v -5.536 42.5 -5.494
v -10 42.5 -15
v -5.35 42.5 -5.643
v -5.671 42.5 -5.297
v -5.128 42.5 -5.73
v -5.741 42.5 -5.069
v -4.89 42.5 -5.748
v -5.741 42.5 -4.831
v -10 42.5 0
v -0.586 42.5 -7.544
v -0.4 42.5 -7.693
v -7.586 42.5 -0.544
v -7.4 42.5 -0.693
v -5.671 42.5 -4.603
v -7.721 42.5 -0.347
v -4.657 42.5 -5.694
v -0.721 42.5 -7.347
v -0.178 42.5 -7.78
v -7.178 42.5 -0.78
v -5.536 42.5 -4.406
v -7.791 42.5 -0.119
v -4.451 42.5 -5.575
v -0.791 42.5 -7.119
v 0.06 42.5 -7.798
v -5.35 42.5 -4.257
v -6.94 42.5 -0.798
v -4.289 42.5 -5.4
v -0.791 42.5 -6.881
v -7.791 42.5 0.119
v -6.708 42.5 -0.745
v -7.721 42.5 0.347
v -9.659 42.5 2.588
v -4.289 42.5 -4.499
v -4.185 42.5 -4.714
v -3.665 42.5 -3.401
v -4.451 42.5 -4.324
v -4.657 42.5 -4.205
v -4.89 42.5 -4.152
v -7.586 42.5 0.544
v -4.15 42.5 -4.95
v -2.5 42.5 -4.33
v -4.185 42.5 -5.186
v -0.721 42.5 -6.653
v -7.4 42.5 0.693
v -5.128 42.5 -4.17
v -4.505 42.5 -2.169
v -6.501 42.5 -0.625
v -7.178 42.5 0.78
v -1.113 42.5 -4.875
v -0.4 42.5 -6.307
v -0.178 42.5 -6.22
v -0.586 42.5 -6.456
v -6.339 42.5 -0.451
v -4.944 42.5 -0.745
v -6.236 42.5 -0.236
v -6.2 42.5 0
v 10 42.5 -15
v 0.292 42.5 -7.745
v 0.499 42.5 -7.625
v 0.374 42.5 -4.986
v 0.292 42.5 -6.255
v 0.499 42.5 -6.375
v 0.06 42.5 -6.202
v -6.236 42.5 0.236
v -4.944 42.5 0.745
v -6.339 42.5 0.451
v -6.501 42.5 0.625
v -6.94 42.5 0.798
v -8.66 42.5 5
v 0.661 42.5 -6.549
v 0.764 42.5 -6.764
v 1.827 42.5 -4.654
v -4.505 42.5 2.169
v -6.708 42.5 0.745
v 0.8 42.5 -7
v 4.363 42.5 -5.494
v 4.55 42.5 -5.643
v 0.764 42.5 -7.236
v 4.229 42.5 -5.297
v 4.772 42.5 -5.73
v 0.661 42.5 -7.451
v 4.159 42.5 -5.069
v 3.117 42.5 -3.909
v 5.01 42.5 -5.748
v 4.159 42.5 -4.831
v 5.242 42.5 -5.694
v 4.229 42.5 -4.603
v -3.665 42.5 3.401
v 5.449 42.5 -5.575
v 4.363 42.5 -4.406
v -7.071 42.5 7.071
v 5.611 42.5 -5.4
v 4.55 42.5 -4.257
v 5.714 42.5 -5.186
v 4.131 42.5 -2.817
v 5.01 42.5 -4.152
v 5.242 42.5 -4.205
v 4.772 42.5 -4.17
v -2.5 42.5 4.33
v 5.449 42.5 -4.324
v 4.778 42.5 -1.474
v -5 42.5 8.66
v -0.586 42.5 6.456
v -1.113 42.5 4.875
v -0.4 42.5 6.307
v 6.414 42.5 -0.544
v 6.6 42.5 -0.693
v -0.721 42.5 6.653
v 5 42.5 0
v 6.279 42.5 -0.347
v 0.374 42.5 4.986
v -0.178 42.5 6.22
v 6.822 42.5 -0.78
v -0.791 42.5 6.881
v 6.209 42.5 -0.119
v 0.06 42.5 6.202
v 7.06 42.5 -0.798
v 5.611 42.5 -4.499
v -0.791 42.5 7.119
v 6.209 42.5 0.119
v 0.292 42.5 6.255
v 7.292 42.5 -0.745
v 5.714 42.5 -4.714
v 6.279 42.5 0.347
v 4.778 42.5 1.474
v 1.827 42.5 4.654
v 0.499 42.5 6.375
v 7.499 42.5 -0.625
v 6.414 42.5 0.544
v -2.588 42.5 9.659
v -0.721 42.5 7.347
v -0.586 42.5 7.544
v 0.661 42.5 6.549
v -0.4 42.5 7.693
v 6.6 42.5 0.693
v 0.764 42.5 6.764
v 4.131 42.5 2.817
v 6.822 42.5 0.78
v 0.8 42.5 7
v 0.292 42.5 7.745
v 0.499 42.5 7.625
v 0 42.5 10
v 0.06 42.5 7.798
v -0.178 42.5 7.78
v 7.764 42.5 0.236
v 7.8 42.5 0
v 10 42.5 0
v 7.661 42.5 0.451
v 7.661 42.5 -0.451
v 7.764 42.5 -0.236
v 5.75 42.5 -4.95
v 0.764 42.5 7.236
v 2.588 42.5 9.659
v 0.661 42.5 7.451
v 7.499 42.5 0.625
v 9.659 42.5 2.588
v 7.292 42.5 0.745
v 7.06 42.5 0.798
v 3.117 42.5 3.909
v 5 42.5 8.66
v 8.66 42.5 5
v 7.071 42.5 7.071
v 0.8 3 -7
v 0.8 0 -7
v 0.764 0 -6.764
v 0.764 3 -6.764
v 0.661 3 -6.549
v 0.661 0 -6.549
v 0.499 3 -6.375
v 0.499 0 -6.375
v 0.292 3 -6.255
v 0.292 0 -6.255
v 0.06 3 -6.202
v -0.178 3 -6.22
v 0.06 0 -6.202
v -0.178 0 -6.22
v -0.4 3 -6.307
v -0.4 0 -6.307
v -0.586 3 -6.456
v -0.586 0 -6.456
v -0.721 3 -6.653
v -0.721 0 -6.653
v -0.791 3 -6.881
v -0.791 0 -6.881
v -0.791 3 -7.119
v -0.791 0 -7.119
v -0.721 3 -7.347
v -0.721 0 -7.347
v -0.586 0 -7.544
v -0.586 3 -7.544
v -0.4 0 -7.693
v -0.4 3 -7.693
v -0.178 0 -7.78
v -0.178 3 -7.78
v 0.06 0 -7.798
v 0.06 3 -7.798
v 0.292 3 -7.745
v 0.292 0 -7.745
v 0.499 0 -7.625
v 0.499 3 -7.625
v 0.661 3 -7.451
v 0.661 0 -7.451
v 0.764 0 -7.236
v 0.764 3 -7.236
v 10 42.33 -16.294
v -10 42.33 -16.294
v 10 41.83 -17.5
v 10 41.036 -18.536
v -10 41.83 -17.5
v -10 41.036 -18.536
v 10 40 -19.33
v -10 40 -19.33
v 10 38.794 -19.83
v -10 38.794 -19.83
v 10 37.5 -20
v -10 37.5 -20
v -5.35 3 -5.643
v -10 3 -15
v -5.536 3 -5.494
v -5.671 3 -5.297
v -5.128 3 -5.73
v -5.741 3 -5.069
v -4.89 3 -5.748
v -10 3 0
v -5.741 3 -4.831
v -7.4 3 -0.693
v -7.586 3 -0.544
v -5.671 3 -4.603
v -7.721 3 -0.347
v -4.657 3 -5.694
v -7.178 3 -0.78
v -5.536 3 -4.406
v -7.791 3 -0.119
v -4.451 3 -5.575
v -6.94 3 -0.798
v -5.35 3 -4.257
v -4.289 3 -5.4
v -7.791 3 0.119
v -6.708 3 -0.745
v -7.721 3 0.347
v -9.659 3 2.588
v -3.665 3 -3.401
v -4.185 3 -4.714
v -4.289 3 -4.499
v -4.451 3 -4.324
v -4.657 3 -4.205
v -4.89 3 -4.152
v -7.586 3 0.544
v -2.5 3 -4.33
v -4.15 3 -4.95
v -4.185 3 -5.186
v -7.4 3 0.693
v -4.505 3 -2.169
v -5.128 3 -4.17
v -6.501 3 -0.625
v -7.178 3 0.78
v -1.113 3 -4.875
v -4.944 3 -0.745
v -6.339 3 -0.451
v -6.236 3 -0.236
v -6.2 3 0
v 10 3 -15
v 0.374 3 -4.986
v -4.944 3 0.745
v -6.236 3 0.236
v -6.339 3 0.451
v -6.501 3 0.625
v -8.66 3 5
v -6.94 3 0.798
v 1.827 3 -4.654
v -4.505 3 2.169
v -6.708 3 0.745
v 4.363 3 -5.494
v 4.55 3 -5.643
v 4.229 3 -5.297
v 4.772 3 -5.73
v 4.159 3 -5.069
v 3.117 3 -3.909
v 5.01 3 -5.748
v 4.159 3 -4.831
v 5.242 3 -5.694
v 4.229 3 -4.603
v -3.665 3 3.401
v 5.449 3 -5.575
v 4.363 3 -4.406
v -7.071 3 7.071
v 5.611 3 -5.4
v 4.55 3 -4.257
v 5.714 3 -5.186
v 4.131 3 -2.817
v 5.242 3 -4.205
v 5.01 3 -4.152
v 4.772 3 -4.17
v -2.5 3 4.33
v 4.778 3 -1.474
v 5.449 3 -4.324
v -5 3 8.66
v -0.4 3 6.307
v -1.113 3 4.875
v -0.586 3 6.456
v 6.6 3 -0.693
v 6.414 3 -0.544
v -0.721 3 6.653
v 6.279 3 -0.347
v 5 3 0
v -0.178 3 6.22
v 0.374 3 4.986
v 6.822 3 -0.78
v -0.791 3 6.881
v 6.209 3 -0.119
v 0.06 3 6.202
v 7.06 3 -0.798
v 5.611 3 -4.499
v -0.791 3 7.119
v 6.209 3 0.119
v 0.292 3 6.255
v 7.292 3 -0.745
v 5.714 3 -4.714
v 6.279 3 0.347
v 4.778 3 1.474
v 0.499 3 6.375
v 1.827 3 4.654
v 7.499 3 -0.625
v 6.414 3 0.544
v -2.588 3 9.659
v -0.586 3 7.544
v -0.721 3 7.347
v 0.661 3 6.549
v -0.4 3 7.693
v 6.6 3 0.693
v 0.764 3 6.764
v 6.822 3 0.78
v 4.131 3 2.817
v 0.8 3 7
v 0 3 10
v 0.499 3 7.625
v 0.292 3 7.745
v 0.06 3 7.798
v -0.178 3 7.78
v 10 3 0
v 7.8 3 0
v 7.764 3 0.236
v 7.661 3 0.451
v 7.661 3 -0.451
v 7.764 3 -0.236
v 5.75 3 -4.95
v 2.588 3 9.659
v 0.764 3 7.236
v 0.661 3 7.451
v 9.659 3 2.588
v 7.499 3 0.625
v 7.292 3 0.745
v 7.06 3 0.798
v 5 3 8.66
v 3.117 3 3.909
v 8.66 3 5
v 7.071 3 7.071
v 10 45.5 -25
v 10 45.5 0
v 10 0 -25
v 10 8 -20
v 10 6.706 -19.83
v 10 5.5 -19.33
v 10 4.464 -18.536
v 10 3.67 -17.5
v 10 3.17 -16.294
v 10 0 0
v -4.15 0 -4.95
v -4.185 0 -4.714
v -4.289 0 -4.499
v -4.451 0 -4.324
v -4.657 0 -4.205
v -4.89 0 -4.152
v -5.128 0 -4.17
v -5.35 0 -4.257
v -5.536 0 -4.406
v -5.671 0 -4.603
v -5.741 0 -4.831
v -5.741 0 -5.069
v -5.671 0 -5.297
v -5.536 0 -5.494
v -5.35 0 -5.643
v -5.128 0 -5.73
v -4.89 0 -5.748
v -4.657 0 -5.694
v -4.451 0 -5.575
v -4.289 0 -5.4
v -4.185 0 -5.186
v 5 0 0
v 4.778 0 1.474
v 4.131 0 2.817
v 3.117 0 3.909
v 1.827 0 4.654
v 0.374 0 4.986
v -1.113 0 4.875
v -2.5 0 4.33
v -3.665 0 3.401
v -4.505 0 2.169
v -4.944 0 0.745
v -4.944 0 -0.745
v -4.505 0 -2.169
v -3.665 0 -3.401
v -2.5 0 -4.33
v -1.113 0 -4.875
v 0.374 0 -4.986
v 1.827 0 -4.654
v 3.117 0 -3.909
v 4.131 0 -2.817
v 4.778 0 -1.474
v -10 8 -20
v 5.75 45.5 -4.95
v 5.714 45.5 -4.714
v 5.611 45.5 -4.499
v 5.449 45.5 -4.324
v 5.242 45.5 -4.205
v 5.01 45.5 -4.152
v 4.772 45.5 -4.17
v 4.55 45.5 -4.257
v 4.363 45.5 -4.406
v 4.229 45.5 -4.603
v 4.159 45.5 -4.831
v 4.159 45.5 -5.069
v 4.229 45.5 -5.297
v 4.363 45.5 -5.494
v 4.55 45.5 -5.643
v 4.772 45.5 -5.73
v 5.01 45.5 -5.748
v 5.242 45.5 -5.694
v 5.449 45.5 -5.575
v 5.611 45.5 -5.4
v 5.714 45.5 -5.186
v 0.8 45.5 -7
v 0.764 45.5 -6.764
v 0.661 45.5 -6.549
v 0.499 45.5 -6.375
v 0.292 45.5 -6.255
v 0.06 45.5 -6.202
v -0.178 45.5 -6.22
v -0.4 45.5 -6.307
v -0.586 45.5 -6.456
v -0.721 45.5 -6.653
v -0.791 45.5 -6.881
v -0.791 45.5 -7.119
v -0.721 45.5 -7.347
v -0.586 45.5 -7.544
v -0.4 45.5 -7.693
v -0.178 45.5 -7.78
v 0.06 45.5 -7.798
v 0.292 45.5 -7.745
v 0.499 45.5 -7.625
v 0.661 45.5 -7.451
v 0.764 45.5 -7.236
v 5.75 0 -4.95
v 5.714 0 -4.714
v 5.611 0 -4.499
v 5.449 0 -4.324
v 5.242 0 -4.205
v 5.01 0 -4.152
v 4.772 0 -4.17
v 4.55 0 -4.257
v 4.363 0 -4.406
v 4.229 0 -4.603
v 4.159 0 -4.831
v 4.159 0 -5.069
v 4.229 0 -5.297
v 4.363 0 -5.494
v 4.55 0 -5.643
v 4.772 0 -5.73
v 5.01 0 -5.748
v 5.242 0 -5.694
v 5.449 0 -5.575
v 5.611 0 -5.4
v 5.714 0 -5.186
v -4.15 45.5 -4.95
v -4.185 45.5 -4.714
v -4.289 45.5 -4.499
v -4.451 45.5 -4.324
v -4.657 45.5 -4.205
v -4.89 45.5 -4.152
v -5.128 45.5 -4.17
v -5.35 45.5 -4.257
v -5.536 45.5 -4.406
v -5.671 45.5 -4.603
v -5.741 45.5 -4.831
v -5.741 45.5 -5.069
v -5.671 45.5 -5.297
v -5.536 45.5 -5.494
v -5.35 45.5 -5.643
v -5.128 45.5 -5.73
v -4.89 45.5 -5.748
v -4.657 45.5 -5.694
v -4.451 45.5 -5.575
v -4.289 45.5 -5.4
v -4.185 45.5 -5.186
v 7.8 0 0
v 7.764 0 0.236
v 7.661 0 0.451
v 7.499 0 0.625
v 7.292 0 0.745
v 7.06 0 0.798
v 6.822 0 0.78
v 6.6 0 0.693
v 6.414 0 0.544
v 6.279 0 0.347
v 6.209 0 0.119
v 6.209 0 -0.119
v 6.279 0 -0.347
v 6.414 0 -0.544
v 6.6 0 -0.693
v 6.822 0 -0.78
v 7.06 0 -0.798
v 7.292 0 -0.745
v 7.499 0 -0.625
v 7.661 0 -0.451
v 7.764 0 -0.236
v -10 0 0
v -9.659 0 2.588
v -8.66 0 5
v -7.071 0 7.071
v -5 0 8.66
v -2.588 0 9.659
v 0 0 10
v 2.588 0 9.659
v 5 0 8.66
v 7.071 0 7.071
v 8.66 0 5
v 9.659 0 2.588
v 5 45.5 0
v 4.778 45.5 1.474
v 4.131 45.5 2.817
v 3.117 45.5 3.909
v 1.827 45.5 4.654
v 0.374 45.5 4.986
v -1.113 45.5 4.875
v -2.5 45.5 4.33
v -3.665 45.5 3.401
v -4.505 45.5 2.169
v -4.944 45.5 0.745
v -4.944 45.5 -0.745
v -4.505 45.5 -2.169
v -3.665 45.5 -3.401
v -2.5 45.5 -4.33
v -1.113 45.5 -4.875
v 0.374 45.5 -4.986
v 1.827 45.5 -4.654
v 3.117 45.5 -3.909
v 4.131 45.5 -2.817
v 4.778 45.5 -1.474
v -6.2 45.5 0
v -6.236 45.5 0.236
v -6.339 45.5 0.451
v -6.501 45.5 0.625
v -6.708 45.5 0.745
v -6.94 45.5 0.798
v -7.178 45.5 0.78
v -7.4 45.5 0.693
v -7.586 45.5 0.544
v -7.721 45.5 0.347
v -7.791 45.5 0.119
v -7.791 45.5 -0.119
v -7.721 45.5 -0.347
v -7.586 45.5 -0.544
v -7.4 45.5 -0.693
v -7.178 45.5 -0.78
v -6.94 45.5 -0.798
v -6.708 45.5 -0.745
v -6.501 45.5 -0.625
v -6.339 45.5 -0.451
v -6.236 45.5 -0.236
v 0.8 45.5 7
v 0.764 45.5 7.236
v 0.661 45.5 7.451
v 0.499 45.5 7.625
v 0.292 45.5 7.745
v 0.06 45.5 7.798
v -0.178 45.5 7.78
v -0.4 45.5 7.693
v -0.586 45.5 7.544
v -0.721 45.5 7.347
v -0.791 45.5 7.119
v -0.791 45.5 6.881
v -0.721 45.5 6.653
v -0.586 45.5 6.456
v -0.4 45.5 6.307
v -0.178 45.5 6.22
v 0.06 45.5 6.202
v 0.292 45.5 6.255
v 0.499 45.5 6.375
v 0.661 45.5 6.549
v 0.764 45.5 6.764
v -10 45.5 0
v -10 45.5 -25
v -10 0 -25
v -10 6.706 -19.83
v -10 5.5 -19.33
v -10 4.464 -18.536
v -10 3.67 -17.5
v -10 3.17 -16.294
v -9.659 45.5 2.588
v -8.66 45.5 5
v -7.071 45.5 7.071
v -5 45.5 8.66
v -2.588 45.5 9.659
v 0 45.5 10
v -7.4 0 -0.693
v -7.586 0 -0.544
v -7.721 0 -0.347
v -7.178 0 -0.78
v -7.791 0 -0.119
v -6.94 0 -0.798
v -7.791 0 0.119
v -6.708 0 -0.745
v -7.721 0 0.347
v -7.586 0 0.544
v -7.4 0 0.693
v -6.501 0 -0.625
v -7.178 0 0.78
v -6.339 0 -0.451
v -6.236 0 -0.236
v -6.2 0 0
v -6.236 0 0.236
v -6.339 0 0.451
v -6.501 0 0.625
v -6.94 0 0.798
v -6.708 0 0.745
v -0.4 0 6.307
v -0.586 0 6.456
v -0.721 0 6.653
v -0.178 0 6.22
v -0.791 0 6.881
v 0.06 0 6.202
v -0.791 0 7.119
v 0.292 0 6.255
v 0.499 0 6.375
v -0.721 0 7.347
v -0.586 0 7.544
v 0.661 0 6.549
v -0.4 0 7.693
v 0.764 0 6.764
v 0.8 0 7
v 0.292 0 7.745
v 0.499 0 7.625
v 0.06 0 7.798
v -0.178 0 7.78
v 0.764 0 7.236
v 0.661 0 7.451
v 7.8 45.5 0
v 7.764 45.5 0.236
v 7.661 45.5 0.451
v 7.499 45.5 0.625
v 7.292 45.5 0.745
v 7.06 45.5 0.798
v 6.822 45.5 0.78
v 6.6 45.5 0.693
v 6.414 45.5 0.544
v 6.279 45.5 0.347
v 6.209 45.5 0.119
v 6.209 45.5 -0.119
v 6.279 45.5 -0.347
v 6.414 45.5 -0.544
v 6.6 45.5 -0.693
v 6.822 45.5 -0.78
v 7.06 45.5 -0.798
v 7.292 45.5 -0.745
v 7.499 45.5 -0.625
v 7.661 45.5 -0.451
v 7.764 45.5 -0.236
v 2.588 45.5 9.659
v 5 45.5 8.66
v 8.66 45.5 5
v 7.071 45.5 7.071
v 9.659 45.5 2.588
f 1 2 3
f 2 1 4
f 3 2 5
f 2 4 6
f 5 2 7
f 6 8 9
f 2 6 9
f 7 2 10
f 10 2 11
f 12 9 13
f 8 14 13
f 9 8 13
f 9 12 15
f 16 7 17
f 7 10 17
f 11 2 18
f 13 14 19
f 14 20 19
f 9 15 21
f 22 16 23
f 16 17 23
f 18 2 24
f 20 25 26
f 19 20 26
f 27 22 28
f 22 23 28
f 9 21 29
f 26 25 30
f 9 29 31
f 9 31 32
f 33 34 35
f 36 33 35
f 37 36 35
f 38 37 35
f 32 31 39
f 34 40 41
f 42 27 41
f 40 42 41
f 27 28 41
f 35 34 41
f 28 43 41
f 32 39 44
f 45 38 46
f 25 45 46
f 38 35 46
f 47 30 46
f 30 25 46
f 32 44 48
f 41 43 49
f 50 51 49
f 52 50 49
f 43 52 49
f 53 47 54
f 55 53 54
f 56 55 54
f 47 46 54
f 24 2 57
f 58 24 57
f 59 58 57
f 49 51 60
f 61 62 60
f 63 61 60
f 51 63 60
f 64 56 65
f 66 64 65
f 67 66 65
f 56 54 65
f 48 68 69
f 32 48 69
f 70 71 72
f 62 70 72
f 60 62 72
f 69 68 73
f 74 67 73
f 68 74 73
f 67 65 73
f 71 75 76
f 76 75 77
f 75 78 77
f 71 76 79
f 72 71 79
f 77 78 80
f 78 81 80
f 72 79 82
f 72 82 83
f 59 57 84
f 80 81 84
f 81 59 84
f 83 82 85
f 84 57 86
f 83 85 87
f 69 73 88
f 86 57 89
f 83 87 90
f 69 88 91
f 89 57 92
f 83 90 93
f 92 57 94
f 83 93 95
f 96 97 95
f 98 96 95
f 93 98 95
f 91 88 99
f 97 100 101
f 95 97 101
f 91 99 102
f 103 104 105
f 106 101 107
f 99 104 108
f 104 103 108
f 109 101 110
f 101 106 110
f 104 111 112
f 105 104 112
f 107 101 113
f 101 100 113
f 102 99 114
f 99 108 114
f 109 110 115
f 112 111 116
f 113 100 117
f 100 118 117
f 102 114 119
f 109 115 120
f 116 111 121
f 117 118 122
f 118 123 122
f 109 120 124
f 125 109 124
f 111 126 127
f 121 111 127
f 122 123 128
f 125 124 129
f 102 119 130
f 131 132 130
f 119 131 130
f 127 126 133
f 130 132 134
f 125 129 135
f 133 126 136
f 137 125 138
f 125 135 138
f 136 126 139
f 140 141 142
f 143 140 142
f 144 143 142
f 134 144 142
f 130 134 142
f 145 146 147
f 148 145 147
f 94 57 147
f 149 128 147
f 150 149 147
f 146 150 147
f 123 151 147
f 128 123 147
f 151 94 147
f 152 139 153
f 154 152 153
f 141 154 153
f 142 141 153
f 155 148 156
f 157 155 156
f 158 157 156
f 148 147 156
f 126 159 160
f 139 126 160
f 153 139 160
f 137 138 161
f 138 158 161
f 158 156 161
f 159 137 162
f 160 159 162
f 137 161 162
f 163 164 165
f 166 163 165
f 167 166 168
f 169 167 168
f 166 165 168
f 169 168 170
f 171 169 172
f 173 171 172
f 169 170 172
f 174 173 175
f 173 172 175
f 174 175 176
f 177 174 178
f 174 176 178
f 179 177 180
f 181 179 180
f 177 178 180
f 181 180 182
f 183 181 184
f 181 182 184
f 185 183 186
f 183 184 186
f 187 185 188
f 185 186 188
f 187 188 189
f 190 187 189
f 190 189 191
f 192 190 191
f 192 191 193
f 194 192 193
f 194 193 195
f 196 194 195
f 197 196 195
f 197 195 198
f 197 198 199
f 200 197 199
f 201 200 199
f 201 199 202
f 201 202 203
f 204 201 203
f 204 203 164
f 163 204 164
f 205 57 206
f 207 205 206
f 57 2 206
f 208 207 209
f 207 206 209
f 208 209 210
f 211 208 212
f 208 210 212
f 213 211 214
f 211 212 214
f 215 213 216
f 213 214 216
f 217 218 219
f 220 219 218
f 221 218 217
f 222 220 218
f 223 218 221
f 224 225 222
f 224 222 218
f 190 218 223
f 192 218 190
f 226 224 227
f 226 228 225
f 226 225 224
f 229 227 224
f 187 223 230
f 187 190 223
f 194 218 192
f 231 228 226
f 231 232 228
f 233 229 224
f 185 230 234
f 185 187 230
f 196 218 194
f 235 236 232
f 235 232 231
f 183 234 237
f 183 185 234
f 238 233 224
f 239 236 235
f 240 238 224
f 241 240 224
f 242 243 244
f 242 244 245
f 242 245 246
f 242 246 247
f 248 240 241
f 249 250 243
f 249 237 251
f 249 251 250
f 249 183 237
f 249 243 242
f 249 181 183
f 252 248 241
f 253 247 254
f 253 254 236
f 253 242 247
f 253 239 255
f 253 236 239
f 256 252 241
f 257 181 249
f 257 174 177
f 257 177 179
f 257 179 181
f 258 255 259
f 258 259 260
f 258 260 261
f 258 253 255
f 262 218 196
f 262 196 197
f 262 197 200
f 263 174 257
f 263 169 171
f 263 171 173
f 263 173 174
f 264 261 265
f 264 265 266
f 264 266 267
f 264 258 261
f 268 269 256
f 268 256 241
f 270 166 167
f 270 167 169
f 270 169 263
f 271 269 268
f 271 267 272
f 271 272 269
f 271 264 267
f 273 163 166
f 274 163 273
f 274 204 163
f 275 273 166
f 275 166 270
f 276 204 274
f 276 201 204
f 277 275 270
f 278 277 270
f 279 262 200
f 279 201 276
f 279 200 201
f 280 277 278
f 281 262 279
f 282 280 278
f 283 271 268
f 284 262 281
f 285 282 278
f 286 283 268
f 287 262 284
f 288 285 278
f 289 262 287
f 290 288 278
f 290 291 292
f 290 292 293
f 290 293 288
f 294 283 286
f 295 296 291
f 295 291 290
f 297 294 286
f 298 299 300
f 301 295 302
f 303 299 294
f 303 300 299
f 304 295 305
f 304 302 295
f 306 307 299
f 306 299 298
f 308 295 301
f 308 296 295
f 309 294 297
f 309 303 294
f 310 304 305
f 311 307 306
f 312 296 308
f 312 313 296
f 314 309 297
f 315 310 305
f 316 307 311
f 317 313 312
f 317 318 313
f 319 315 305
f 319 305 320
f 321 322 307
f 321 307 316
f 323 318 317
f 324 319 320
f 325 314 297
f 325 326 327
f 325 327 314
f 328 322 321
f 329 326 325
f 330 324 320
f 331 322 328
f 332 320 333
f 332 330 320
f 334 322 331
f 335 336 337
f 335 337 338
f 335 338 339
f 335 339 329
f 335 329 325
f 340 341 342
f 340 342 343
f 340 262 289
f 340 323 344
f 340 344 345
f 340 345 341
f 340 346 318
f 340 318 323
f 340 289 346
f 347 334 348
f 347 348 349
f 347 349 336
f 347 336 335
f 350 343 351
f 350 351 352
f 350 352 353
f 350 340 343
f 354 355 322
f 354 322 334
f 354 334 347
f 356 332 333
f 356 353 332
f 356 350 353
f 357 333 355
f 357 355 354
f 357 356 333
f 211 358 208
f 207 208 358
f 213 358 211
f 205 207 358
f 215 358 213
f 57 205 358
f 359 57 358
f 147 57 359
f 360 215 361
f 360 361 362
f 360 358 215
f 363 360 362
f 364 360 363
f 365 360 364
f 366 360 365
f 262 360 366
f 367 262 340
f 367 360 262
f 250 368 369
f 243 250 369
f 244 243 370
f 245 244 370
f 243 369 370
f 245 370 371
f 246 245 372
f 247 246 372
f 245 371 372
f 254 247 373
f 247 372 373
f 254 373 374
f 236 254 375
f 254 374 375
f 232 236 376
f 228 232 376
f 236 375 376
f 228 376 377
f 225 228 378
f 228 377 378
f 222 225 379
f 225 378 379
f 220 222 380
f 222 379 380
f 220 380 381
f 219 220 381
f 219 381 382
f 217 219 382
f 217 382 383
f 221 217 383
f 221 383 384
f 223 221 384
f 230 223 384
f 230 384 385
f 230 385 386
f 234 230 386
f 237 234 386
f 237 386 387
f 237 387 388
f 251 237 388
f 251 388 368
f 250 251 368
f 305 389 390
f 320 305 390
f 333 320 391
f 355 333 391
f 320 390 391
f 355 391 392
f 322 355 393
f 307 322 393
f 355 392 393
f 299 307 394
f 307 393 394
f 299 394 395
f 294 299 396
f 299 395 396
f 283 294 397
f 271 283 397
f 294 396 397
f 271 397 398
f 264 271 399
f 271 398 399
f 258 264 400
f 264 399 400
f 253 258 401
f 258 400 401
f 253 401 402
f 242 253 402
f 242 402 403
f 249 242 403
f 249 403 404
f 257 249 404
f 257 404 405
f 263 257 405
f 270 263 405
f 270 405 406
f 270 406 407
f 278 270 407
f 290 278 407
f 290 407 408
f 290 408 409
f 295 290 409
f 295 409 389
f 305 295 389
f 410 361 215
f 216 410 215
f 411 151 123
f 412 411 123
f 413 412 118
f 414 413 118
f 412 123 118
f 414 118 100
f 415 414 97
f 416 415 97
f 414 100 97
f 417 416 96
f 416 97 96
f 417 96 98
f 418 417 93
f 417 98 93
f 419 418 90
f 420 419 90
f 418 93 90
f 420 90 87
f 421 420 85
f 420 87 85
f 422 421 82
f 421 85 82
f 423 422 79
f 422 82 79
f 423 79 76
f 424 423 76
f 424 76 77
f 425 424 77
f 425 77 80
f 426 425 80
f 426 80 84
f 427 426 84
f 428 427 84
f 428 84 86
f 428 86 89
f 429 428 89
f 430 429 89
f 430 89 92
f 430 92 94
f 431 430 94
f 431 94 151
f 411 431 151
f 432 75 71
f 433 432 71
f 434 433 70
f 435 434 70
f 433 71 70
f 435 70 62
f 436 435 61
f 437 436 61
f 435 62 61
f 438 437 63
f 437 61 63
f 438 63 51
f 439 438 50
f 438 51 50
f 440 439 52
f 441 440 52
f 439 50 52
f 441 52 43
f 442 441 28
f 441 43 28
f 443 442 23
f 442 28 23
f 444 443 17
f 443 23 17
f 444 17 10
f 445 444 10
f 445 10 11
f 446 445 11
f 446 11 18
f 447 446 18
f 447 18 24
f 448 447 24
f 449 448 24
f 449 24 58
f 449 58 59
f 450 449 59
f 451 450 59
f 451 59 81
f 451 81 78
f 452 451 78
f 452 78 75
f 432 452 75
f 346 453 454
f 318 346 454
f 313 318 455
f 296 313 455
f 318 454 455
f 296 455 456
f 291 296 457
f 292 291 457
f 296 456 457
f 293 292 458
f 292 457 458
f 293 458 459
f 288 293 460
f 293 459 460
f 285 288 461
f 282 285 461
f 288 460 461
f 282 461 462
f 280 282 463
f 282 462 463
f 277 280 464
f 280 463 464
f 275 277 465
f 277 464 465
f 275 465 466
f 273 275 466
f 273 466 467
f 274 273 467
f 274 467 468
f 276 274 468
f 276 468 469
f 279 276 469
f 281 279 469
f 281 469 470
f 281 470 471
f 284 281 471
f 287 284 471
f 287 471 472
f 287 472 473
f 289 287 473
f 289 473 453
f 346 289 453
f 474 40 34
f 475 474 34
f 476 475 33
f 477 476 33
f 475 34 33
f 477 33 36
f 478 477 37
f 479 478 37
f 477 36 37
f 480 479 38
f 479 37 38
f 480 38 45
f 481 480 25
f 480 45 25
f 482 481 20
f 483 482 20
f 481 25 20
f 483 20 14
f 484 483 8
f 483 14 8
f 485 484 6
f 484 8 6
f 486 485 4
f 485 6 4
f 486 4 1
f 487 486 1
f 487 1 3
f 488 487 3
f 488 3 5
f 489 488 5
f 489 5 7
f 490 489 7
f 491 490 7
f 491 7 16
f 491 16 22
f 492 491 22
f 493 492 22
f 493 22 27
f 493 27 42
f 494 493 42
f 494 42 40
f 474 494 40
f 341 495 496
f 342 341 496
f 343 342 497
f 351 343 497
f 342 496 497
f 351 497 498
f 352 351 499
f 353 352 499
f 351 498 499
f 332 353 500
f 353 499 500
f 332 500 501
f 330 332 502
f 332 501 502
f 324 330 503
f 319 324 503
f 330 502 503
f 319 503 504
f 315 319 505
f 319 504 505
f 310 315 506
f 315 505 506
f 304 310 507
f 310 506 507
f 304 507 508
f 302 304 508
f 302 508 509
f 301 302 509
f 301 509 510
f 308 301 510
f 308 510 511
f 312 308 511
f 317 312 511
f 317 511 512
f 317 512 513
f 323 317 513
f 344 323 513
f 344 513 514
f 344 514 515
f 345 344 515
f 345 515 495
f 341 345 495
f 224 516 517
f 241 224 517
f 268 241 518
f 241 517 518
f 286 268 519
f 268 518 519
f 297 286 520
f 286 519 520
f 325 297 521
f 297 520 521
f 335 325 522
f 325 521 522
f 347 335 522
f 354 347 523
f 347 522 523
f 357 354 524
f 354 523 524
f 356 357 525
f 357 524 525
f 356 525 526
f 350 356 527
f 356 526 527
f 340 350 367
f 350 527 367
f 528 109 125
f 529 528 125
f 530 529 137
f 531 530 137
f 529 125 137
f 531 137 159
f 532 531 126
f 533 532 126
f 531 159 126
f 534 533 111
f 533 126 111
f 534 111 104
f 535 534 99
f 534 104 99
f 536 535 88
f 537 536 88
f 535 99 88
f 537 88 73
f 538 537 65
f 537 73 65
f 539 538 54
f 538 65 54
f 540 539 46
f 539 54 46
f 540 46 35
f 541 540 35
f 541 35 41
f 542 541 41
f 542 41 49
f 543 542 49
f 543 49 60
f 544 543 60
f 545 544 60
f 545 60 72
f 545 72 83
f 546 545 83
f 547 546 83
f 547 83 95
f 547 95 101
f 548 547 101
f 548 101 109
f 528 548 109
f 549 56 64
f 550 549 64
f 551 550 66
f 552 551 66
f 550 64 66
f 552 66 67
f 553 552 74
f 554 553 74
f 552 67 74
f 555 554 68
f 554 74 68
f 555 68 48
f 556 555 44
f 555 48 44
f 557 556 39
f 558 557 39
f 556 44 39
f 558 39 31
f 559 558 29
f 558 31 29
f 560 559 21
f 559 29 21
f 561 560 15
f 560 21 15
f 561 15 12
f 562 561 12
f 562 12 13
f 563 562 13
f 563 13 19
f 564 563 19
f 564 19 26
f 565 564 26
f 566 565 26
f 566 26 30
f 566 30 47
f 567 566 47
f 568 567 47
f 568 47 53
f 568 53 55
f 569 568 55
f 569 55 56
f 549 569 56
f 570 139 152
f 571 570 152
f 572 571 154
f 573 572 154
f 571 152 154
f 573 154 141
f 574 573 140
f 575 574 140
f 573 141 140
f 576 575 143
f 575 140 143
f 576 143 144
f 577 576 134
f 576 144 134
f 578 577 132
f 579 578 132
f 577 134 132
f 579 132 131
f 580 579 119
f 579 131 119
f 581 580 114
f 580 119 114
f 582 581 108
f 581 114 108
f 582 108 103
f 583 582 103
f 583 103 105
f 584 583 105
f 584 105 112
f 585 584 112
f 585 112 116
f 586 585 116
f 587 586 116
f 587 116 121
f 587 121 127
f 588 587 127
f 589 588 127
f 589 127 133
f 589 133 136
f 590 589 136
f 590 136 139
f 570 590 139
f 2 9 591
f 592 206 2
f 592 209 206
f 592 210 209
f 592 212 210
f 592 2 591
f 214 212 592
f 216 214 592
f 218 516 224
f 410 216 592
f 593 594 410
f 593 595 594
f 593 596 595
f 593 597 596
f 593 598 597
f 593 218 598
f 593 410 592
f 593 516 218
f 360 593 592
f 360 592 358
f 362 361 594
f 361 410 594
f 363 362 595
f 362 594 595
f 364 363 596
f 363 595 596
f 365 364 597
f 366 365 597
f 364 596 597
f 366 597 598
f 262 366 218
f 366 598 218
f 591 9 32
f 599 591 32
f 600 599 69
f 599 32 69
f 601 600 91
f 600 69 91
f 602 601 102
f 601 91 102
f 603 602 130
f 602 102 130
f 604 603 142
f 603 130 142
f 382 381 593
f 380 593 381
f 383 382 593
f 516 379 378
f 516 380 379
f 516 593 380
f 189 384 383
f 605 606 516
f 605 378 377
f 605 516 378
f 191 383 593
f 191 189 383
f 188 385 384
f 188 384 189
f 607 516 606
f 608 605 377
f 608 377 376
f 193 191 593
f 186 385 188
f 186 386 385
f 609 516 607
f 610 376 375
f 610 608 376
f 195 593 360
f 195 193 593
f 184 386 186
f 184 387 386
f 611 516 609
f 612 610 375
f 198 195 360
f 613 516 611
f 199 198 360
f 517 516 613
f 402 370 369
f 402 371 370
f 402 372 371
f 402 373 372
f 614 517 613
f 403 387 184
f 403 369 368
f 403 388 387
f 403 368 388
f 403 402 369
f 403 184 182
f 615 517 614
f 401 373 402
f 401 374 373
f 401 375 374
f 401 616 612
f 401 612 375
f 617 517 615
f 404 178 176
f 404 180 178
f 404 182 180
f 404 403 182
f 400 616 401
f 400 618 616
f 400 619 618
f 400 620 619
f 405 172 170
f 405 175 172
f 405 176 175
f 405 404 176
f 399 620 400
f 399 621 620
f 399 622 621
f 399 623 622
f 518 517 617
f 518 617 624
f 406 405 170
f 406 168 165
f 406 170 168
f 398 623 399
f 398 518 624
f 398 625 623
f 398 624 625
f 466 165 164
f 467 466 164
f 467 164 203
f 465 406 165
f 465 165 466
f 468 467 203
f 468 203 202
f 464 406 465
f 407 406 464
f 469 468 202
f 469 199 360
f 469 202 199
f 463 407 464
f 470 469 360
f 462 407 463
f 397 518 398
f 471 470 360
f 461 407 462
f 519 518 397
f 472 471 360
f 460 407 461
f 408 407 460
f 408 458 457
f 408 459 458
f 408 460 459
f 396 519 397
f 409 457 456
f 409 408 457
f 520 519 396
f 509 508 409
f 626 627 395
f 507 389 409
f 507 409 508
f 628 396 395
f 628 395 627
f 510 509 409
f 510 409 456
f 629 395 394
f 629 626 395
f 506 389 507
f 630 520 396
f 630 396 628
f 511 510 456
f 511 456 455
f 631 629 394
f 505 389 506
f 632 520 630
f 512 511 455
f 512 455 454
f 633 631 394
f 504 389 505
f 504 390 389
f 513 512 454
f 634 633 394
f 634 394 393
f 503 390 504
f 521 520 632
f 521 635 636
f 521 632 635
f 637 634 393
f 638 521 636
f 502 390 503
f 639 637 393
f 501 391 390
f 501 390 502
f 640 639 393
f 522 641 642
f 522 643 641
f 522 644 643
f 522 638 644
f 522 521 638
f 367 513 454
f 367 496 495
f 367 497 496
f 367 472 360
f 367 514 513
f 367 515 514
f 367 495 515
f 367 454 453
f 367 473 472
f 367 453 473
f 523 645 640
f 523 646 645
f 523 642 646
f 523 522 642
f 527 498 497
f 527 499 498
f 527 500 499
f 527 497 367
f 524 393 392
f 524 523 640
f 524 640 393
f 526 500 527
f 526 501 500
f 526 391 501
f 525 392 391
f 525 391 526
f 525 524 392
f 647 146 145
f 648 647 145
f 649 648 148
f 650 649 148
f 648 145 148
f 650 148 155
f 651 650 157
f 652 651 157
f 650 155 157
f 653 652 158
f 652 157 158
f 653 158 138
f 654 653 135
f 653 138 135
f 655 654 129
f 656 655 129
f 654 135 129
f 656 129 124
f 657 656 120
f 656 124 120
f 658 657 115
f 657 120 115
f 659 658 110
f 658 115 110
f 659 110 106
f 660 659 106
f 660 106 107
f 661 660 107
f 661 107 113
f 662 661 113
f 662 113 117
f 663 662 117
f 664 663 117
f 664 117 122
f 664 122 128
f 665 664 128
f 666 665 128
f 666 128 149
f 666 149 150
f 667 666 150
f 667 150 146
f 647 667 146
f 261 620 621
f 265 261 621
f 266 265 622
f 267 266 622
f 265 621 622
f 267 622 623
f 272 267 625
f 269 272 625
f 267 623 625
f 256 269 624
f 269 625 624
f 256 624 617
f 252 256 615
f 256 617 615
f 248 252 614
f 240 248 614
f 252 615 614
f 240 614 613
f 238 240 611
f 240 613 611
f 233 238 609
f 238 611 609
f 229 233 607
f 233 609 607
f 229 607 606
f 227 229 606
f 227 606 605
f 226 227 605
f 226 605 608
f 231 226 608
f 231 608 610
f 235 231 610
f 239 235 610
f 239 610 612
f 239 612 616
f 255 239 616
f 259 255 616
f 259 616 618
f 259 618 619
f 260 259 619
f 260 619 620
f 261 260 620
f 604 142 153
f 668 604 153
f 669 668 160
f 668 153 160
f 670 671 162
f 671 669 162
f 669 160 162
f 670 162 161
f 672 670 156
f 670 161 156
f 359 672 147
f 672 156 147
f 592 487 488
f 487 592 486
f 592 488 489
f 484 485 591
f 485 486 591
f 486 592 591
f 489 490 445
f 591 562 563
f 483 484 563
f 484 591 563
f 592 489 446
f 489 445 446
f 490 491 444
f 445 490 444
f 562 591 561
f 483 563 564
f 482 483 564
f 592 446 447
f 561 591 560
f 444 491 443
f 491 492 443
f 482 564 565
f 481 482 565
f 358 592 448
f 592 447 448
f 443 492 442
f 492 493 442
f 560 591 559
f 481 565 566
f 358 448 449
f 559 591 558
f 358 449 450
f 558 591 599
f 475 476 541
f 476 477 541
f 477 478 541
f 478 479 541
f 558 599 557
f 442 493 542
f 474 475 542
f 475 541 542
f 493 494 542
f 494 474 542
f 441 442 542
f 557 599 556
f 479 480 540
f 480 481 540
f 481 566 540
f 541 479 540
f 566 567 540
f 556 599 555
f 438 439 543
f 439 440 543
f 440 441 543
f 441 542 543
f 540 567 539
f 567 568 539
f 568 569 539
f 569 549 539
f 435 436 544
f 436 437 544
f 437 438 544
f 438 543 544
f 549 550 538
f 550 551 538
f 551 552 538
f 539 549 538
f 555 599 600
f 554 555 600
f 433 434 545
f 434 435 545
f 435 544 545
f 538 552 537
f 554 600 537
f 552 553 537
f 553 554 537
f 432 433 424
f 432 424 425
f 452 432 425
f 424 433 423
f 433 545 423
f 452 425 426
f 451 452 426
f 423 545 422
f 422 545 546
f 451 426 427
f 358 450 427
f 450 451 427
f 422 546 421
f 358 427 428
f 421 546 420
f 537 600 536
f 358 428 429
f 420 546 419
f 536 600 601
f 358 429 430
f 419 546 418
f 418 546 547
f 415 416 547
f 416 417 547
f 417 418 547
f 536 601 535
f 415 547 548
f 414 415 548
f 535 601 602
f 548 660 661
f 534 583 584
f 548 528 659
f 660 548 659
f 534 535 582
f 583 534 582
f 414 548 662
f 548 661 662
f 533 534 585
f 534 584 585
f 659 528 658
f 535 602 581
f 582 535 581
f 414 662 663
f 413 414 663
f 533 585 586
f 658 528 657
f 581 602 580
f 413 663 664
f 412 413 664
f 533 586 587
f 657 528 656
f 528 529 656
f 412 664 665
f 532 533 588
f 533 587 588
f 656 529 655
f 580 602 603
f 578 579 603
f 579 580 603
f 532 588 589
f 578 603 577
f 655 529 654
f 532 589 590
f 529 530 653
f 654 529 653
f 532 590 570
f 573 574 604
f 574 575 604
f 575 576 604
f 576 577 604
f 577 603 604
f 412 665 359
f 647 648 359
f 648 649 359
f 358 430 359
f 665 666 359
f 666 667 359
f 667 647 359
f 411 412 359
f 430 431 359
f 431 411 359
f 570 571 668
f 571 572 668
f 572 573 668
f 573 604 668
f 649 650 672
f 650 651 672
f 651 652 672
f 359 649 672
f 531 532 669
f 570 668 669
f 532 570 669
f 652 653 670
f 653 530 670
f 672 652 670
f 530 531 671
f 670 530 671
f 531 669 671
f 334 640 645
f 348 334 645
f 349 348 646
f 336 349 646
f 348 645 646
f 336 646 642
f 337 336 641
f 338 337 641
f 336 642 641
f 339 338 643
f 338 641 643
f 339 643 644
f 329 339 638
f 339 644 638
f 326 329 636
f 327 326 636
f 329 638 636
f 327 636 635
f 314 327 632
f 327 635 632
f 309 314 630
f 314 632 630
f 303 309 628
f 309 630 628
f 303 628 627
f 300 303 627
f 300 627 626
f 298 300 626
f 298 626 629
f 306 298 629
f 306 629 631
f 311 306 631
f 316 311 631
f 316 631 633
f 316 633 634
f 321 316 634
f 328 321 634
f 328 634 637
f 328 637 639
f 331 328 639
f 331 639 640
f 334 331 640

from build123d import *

# Parameters (mm, degrees)
F0_R     = 0.8
F0_R_2   = 5
F1_DEPTH = 45.5
F2_W     = 39.5
F2_H     = 30
F3_DEPTH = 20.001
F4_DEPTH = 45.501
F5_R     = 5


with BuildPart() as f1:
    # F0 (on Front) → F1 (new body)
    with BuildSketch(Plane.XZ):
        with BuildLine():
            ThreePointArc((-2.67e-08, 10), (-7.0710678213, 7.0710678024), (-10, 0))
            ThreePointArc((-10, 0), (0, -10), (10, 0))
            ThreePointArc((10, 0), (7.0710678024, 7.0710678213), (-2.67e-08, 10))
        make_face()
        with Locations((-7, 0)):
            Circle(F0_R, mode=Mode.SUBTRACT)
        with Locations((-4.9497474683, -4.9497474683)):
            Circle(F0_R, mode=Mode.SUBTRACT)
        with Locations((0, -7)):
            Circle(F0_R, mode=Mode.SUBTRACT)
        with Locations((4.9497474683, -4.9497474683)):
            Circle(F0_R, mode=Mode.SUBTRACT)
        Circle(F0_R_2, mode=Mode.SUBTRACT)
        with Locations((7, 0)):
            Circle(F0_R, mode=Mode.SUBTRACT)
        with Locations((0, 7)):
            Circle(F0_R, mode=Mode.SUBTRACT)
        with BuildLine():
            ThreePointArc((10, 0), (0, -10), (-10, 0))
            Line((-10, 0), (-10, -22))
            Line((-10, -22), (10, -22))
            Line((10, -22), (10, 0))
        make_face()
        Circle(F0_R_2)
        Polygon((10, -22), (-10, -22), (-10, -25), (0, -25), (10, -25), align=None)
        with BuildLine():
            ThreePointArc((-2.67e-08, 10), (7.0710678024, 7.0710678213), (10, 0))
            Line((10, 0), (10, 10))
            Line((10, 10), (-2.67e-08, 10))
        make_face()
        with BuildLine():
            Line((-10, 10), (-10, 0))
            ThreePointArc((-10, 0), (-7.0710678213, 7.0710678024), (-2.67e-08, 10))
            Line((-2.67e-08, 10), (-10, 10))
        make_face()
        with Locations((0, -7)):
            Circle(F0_R)
        with Locations((7, 0)):
            Circle(F0_R)
        with Locations((-4.9497474683, -4.9497474683)):
            Circle(F0_R)
        with Locations((-7, 0)):
            Circle(F0_R)
        with Locations((0, 7)):
            Circle(F0_R)
        with Locations((4.9497474683, -4.9497474683)):
            Circle(F0_R)
    extrude(amount=-F1_DEPTH)

    # F2 (on face) → F3 (cut, through all)
    with BuildSketch(Plane.YZ.offset(10)):
        with Locations((22.75, -5)):
            Rectangle(F2_W, F2_H)
    extrude(amount=-F3_DEPTH, mode=Mode.SUBTRACT)

    # F0 (on Front) → F4 (cut, through all)
    with BuildSketch(Plane.XZ):
        Circle(F0_R_2)
        with BuildLine():
            Line((-10, 10), (-10, 0))
            ThreePointArc((-10, 0), (-7.0710678213, 7.0710678024), (-2.67e-08, 10))
            Line((-2.67e-08, 10), (-10, 10))
        make_face()
        with BuildLine():
            ThreePointArc((-2.67e-08, 10), (7.0710678024, 7.0710678213), (10, 0))
            Line((10, 0), (10, 10))
            Line((10, 10), (-2.67e-08, 10))
        make_face()
        with Locations((7, 0)):
            Circle(F0_R)
        with Locations((0, 7)):
            Circle(F0_R)
        with Locations((-7, 0)):
            Circle(F0_R)
        with Locations((-4.9497474683, -4.9497474683)):
            Circle(F0_R)
        with Locations((0, -7)):
            Circle(F0_R)
        with Locations((4.9497474683, -4.9497474683)):
            Circle(F0_R)
    extrude(amount=-F4_DEPTH, mode=Mode.SUBTRACT)

    # F5
    f5_edges = [f1.edges().sort_by_distance(p)[0] for p in [
        (0, 42.5, -20),
        (0, 3, -20),
    ]]
    fillet(f5_edges, radius=F5_R)


solid = f1.part
